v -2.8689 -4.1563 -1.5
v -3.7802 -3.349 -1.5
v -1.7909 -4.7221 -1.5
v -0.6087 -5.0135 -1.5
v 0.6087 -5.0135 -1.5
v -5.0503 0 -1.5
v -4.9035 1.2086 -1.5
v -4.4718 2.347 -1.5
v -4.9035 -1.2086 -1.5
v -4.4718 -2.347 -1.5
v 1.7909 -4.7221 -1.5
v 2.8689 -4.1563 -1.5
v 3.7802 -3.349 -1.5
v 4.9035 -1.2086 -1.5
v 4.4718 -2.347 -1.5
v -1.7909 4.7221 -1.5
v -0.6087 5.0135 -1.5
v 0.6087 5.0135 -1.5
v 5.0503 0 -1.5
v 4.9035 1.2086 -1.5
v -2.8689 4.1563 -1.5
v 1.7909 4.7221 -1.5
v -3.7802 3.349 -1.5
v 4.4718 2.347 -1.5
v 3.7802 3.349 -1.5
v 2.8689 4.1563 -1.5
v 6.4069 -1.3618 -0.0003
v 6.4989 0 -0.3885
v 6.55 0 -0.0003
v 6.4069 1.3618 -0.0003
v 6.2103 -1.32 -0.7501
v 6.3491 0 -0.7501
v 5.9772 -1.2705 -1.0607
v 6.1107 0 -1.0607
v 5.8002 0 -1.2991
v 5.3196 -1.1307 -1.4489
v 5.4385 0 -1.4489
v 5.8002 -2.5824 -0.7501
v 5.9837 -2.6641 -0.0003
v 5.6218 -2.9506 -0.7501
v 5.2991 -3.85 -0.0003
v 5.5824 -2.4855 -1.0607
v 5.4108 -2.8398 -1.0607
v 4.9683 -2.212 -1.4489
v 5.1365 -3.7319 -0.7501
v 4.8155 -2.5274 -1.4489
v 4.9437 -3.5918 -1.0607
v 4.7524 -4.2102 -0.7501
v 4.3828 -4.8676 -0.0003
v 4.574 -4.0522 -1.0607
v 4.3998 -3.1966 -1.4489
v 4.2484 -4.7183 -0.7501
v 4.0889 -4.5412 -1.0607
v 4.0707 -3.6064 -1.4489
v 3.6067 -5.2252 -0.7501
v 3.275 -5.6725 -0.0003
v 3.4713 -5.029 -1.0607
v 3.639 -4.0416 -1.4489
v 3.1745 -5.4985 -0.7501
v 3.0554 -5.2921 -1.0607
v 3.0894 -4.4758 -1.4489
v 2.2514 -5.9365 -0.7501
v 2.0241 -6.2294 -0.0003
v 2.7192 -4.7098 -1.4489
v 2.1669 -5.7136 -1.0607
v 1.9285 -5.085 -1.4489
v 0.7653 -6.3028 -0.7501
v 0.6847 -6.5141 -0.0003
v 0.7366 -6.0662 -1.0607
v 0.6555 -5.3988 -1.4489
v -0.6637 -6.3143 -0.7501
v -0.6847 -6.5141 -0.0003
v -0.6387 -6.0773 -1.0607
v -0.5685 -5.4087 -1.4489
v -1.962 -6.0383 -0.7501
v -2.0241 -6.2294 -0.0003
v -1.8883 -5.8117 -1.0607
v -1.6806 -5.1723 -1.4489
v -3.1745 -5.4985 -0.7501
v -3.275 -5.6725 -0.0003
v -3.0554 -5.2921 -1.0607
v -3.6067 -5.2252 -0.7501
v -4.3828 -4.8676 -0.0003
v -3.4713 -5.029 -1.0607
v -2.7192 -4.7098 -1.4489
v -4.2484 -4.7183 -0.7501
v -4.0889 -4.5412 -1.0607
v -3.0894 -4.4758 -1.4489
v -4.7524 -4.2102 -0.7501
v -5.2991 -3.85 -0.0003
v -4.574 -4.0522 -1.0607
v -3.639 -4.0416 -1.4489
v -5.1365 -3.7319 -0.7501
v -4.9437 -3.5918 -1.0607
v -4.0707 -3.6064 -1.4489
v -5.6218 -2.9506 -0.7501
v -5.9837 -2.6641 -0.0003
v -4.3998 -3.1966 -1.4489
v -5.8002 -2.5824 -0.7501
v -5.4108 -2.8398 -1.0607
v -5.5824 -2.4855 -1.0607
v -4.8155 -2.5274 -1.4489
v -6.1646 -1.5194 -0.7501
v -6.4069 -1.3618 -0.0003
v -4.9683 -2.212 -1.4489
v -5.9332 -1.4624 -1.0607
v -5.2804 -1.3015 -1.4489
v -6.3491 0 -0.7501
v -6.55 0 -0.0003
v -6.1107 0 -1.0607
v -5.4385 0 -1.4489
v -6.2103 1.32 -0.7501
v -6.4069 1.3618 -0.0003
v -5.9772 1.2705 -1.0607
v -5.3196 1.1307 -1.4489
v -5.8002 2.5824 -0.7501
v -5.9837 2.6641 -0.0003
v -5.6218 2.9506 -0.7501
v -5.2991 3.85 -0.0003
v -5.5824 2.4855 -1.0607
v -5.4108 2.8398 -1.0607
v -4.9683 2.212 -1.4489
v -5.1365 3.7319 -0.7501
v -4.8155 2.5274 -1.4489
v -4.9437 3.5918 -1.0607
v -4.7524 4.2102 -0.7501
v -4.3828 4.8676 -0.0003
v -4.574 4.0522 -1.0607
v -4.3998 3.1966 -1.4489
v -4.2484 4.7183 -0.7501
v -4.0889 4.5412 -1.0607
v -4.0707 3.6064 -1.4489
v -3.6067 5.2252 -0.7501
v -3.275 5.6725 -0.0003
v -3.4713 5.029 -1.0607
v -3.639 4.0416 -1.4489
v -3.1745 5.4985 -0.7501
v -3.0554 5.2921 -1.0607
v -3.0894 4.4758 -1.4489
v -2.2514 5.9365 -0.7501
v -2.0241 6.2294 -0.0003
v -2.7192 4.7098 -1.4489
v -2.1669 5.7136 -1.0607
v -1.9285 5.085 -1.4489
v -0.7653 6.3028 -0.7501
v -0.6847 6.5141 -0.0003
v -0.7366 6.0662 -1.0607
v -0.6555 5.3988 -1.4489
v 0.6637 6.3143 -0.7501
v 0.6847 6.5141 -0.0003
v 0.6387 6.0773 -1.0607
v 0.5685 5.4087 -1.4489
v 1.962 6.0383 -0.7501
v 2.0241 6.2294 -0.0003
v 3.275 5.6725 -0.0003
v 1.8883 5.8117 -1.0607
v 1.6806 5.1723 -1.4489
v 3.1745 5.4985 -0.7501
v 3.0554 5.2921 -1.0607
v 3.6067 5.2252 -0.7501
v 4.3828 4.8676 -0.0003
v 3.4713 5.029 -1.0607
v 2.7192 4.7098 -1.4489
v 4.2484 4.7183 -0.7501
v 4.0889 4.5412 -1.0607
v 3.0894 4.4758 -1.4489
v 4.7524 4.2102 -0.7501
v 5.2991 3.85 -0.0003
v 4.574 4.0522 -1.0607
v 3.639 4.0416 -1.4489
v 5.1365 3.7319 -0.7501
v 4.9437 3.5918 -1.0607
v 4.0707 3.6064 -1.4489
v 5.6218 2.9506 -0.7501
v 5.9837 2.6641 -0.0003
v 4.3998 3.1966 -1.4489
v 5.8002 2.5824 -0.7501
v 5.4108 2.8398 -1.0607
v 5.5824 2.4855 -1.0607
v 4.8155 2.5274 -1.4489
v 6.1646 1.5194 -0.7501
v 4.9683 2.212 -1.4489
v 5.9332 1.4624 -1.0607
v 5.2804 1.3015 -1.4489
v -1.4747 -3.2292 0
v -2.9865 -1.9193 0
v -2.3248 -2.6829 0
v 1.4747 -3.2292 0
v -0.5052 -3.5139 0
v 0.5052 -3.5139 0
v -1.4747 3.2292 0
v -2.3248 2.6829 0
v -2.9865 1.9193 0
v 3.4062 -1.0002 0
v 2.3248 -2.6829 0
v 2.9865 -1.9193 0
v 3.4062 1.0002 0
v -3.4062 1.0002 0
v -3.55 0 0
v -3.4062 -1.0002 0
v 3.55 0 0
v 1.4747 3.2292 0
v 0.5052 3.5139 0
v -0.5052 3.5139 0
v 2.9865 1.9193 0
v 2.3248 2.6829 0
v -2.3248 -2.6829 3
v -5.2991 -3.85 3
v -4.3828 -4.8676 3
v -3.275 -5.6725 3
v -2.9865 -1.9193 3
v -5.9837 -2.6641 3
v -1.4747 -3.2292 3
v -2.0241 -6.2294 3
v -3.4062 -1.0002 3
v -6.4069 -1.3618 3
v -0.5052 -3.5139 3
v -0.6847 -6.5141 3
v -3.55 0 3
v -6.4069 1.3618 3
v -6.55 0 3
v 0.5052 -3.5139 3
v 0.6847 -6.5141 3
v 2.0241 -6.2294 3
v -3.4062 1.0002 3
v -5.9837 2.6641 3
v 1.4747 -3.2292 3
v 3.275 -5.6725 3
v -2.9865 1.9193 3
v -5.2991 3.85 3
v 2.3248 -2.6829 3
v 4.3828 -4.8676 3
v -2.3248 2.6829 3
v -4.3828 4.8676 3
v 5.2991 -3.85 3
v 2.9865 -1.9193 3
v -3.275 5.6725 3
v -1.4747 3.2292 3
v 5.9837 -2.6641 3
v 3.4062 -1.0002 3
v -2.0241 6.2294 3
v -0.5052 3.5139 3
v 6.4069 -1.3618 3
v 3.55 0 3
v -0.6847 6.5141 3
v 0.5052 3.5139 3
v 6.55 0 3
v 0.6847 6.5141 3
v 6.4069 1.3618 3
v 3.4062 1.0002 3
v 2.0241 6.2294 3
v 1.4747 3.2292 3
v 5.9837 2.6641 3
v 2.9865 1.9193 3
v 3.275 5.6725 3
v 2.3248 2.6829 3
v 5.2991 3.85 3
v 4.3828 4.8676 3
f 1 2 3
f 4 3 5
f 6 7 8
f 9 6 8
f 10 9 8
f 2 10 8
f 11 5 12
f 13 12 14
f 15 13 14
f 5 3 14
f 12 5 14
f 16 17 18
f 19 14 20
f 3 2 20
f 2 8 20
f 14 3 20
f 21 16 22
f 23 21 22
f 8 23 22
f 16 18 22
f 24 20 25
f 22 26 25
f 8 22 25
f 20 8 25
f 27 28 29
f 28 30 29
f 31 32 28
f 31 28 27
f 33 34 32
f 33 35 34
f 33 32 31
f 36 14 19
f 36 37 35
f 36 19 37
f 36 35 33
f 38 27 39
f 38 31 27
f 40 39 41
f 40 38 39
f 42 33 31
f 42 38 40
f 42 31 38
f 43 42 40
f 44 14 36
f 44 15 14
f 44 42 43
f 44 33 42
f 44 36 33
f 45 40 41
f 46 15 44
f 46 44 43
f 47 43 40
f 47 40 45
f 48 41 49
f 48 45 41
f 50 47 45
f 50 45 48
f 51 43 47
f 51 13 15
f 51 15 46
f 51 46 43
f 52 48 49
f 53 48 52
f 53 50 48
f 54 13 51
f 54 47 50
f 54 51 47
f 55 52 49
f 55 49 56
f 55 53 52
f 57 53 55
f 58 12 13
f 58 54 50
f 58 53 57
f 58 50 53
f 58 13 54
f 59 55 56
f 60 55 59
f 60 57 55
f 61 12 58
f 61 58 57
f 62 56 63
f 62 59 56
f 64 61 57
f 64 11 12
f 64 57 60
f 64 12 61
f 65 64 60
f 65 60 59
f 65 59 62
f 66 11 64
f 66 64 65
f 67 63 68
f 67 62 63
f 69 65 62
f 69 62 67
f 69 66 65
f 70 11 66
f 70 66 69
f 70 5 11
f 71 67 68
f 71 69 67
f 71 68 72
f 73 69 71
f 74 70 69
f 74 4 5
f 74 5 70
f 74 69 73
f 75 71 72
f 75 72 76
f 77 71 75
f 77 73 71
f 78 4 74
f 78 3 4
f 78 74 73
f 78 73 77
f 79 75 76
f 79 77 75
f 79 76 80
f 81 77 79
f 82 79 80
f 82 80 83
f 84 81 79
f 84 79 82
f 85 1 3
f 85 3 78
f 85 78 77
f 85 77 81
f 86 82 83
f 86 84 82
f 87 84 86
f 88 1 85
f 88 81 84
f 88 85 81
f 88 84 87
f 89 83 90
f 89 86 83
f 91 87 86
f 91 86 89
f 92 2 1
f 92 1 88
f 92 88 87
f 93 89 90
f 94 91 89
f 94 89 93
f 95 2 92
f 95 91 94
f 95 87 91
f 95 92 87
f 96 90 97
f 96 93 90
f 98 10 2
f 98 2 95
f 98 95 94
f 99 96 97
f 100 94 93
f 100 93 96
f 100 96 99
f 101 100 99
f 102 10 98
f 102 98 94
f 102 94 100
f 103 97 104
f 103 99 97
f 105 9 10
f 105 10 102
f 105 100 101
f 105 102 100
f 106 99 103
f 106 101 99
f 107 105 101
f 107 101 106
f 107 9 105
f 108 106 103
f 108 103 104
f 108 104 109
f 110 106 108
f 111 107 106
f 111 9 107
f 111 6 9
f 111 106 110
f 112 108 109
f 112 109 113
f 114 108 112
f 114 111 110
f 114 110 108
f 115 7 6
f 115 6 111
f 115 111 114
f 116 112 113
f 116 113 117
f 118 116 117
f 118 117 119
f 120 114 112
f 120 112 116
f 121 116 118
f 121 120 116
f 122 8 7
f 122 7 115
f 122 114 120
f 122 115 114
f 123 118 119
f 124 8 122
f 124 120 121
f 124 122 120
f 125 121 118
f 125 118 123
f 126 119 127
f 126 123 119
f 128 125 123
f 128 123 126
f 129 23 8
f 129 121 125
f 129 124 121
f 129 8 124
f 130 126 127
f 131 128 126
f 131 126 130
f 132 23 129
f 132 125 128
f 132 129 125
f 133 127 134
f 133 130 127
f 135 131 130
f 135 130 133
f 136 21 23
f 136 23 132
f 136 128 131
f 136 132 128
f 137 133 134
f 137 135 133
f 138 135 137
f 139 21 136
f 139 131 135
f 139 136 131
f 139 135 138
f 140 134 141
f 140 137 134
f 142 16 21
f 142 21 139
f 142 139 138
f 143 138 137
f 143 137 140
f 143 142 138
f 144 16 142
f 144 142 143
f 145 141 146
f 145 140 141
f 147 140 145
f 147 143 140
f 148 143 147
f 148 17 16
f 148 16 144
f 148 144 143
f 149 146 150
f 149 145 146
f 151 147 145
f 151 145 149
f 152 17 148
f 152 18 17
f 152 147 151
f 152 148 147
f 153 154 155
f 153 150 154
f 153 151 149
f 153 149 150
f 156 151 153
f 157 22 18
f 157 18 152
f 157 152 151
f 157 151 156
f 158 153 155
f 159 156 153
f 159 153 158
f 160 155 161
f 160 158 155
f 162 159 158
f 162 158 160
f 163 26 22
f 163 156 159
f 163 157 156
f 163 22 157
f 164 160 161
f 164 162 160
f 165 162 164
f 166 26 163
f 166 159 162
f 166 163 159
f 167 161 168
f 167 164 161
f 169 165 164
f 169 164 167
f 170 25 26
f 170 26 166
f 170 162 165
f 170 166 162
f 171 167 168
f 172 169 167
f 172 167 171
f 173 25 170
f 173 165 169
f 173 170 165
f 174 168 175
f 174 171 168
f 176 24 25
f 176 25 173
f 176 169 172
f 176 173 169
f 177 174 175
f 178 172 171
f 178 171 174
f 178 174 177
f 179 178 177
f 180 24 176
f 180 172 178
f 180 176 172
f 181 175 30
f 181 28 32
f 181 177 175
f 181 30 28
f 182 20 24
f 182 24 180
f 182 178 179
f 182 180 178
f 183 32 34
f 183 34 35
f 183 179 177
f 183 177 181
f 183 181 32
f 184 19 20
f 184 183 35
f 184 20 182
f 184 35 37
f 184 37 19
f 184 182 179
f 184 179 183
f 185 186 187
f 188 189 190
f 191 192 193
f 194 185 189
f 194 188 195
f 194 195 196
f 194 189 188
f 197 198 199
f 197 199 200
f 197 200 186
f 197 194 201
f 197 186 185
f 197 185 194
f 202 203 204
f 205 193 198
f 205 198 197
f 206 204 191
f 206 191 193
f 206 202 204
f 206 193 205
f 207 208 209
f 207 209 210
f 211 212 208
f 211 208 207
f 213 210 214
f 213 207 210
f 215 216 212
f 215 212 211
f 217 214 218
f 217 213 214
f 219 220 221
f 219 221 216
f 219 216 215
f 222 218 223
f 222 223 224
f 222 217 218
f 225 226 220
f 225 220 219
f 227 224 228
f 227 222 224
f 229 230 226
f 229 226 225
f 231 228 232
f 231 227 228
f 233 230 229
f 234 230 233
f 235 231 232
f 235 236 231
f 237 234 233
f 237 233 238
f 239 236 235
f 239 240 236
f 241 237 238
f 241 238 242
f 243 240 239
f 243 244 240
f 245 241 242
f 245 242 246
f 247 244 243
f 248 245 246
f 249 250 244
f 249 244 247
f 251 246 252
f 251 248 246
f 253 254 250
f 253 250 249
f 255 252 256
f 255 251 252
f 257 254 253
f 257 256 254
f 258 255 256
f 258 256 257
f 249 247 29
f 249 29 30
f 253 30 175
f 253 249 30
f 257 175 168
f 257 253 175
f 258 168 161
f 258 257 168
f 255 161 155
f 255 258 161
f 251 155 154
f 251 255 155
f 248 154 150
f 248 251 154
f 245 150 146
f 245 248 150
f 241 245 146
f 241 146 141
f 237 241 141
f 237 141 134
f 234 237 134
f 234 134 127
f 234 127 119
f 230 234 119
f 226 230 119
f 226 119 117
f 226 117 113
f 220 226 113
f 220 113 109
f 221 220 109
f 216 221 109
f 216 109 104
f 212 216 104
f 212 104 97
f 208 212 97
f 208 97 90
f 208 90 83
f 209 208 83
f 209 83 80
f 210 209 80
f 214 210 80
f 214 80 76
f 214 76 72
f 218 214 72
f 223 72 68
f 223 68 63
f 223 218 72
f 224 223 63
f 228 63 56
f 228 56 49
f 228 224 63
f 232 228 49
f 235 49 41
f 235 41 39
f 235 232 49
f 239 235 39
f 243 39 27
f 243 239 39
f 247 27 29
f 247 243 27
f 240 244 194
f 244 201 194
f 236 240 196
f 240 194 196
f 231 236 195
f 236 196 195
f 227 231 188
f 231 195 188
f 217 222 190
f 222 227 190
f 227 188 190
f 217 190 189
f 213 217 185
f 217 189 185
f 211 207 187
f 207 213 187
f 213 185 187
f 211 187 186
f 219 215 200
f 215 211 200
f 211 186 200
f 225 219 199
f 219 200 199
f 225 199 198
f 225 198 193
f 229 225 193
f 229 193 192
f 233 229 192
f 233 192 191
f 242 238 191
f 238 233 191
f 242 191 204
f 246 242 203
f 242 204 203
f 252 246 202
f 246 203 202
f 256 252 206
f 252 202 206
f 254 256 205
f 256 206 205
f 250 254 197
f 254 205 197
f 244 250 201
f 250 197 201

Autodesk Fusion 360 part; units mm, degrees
sketch "Sketch1" plane through (0, 0, 0) normal (0, 0, 1) x (1, 0, 0)
  circle A0 centre (0, 0) radius 3.55
  circle A1 centre (0, 0) radius 6.55
  dimension "d1" = 7.1
  dimension "d2" = 3
extrude "Extrude1" add sketch "Sketch1" along normal blind 3
extrude "Extrude3" add sketch "Sketch1" against normal blind 1.5 contours A0 | A1
fillet "Fillet1" radius 1.5 1 edges at (-6.1067, 2.3686, -1.5)
